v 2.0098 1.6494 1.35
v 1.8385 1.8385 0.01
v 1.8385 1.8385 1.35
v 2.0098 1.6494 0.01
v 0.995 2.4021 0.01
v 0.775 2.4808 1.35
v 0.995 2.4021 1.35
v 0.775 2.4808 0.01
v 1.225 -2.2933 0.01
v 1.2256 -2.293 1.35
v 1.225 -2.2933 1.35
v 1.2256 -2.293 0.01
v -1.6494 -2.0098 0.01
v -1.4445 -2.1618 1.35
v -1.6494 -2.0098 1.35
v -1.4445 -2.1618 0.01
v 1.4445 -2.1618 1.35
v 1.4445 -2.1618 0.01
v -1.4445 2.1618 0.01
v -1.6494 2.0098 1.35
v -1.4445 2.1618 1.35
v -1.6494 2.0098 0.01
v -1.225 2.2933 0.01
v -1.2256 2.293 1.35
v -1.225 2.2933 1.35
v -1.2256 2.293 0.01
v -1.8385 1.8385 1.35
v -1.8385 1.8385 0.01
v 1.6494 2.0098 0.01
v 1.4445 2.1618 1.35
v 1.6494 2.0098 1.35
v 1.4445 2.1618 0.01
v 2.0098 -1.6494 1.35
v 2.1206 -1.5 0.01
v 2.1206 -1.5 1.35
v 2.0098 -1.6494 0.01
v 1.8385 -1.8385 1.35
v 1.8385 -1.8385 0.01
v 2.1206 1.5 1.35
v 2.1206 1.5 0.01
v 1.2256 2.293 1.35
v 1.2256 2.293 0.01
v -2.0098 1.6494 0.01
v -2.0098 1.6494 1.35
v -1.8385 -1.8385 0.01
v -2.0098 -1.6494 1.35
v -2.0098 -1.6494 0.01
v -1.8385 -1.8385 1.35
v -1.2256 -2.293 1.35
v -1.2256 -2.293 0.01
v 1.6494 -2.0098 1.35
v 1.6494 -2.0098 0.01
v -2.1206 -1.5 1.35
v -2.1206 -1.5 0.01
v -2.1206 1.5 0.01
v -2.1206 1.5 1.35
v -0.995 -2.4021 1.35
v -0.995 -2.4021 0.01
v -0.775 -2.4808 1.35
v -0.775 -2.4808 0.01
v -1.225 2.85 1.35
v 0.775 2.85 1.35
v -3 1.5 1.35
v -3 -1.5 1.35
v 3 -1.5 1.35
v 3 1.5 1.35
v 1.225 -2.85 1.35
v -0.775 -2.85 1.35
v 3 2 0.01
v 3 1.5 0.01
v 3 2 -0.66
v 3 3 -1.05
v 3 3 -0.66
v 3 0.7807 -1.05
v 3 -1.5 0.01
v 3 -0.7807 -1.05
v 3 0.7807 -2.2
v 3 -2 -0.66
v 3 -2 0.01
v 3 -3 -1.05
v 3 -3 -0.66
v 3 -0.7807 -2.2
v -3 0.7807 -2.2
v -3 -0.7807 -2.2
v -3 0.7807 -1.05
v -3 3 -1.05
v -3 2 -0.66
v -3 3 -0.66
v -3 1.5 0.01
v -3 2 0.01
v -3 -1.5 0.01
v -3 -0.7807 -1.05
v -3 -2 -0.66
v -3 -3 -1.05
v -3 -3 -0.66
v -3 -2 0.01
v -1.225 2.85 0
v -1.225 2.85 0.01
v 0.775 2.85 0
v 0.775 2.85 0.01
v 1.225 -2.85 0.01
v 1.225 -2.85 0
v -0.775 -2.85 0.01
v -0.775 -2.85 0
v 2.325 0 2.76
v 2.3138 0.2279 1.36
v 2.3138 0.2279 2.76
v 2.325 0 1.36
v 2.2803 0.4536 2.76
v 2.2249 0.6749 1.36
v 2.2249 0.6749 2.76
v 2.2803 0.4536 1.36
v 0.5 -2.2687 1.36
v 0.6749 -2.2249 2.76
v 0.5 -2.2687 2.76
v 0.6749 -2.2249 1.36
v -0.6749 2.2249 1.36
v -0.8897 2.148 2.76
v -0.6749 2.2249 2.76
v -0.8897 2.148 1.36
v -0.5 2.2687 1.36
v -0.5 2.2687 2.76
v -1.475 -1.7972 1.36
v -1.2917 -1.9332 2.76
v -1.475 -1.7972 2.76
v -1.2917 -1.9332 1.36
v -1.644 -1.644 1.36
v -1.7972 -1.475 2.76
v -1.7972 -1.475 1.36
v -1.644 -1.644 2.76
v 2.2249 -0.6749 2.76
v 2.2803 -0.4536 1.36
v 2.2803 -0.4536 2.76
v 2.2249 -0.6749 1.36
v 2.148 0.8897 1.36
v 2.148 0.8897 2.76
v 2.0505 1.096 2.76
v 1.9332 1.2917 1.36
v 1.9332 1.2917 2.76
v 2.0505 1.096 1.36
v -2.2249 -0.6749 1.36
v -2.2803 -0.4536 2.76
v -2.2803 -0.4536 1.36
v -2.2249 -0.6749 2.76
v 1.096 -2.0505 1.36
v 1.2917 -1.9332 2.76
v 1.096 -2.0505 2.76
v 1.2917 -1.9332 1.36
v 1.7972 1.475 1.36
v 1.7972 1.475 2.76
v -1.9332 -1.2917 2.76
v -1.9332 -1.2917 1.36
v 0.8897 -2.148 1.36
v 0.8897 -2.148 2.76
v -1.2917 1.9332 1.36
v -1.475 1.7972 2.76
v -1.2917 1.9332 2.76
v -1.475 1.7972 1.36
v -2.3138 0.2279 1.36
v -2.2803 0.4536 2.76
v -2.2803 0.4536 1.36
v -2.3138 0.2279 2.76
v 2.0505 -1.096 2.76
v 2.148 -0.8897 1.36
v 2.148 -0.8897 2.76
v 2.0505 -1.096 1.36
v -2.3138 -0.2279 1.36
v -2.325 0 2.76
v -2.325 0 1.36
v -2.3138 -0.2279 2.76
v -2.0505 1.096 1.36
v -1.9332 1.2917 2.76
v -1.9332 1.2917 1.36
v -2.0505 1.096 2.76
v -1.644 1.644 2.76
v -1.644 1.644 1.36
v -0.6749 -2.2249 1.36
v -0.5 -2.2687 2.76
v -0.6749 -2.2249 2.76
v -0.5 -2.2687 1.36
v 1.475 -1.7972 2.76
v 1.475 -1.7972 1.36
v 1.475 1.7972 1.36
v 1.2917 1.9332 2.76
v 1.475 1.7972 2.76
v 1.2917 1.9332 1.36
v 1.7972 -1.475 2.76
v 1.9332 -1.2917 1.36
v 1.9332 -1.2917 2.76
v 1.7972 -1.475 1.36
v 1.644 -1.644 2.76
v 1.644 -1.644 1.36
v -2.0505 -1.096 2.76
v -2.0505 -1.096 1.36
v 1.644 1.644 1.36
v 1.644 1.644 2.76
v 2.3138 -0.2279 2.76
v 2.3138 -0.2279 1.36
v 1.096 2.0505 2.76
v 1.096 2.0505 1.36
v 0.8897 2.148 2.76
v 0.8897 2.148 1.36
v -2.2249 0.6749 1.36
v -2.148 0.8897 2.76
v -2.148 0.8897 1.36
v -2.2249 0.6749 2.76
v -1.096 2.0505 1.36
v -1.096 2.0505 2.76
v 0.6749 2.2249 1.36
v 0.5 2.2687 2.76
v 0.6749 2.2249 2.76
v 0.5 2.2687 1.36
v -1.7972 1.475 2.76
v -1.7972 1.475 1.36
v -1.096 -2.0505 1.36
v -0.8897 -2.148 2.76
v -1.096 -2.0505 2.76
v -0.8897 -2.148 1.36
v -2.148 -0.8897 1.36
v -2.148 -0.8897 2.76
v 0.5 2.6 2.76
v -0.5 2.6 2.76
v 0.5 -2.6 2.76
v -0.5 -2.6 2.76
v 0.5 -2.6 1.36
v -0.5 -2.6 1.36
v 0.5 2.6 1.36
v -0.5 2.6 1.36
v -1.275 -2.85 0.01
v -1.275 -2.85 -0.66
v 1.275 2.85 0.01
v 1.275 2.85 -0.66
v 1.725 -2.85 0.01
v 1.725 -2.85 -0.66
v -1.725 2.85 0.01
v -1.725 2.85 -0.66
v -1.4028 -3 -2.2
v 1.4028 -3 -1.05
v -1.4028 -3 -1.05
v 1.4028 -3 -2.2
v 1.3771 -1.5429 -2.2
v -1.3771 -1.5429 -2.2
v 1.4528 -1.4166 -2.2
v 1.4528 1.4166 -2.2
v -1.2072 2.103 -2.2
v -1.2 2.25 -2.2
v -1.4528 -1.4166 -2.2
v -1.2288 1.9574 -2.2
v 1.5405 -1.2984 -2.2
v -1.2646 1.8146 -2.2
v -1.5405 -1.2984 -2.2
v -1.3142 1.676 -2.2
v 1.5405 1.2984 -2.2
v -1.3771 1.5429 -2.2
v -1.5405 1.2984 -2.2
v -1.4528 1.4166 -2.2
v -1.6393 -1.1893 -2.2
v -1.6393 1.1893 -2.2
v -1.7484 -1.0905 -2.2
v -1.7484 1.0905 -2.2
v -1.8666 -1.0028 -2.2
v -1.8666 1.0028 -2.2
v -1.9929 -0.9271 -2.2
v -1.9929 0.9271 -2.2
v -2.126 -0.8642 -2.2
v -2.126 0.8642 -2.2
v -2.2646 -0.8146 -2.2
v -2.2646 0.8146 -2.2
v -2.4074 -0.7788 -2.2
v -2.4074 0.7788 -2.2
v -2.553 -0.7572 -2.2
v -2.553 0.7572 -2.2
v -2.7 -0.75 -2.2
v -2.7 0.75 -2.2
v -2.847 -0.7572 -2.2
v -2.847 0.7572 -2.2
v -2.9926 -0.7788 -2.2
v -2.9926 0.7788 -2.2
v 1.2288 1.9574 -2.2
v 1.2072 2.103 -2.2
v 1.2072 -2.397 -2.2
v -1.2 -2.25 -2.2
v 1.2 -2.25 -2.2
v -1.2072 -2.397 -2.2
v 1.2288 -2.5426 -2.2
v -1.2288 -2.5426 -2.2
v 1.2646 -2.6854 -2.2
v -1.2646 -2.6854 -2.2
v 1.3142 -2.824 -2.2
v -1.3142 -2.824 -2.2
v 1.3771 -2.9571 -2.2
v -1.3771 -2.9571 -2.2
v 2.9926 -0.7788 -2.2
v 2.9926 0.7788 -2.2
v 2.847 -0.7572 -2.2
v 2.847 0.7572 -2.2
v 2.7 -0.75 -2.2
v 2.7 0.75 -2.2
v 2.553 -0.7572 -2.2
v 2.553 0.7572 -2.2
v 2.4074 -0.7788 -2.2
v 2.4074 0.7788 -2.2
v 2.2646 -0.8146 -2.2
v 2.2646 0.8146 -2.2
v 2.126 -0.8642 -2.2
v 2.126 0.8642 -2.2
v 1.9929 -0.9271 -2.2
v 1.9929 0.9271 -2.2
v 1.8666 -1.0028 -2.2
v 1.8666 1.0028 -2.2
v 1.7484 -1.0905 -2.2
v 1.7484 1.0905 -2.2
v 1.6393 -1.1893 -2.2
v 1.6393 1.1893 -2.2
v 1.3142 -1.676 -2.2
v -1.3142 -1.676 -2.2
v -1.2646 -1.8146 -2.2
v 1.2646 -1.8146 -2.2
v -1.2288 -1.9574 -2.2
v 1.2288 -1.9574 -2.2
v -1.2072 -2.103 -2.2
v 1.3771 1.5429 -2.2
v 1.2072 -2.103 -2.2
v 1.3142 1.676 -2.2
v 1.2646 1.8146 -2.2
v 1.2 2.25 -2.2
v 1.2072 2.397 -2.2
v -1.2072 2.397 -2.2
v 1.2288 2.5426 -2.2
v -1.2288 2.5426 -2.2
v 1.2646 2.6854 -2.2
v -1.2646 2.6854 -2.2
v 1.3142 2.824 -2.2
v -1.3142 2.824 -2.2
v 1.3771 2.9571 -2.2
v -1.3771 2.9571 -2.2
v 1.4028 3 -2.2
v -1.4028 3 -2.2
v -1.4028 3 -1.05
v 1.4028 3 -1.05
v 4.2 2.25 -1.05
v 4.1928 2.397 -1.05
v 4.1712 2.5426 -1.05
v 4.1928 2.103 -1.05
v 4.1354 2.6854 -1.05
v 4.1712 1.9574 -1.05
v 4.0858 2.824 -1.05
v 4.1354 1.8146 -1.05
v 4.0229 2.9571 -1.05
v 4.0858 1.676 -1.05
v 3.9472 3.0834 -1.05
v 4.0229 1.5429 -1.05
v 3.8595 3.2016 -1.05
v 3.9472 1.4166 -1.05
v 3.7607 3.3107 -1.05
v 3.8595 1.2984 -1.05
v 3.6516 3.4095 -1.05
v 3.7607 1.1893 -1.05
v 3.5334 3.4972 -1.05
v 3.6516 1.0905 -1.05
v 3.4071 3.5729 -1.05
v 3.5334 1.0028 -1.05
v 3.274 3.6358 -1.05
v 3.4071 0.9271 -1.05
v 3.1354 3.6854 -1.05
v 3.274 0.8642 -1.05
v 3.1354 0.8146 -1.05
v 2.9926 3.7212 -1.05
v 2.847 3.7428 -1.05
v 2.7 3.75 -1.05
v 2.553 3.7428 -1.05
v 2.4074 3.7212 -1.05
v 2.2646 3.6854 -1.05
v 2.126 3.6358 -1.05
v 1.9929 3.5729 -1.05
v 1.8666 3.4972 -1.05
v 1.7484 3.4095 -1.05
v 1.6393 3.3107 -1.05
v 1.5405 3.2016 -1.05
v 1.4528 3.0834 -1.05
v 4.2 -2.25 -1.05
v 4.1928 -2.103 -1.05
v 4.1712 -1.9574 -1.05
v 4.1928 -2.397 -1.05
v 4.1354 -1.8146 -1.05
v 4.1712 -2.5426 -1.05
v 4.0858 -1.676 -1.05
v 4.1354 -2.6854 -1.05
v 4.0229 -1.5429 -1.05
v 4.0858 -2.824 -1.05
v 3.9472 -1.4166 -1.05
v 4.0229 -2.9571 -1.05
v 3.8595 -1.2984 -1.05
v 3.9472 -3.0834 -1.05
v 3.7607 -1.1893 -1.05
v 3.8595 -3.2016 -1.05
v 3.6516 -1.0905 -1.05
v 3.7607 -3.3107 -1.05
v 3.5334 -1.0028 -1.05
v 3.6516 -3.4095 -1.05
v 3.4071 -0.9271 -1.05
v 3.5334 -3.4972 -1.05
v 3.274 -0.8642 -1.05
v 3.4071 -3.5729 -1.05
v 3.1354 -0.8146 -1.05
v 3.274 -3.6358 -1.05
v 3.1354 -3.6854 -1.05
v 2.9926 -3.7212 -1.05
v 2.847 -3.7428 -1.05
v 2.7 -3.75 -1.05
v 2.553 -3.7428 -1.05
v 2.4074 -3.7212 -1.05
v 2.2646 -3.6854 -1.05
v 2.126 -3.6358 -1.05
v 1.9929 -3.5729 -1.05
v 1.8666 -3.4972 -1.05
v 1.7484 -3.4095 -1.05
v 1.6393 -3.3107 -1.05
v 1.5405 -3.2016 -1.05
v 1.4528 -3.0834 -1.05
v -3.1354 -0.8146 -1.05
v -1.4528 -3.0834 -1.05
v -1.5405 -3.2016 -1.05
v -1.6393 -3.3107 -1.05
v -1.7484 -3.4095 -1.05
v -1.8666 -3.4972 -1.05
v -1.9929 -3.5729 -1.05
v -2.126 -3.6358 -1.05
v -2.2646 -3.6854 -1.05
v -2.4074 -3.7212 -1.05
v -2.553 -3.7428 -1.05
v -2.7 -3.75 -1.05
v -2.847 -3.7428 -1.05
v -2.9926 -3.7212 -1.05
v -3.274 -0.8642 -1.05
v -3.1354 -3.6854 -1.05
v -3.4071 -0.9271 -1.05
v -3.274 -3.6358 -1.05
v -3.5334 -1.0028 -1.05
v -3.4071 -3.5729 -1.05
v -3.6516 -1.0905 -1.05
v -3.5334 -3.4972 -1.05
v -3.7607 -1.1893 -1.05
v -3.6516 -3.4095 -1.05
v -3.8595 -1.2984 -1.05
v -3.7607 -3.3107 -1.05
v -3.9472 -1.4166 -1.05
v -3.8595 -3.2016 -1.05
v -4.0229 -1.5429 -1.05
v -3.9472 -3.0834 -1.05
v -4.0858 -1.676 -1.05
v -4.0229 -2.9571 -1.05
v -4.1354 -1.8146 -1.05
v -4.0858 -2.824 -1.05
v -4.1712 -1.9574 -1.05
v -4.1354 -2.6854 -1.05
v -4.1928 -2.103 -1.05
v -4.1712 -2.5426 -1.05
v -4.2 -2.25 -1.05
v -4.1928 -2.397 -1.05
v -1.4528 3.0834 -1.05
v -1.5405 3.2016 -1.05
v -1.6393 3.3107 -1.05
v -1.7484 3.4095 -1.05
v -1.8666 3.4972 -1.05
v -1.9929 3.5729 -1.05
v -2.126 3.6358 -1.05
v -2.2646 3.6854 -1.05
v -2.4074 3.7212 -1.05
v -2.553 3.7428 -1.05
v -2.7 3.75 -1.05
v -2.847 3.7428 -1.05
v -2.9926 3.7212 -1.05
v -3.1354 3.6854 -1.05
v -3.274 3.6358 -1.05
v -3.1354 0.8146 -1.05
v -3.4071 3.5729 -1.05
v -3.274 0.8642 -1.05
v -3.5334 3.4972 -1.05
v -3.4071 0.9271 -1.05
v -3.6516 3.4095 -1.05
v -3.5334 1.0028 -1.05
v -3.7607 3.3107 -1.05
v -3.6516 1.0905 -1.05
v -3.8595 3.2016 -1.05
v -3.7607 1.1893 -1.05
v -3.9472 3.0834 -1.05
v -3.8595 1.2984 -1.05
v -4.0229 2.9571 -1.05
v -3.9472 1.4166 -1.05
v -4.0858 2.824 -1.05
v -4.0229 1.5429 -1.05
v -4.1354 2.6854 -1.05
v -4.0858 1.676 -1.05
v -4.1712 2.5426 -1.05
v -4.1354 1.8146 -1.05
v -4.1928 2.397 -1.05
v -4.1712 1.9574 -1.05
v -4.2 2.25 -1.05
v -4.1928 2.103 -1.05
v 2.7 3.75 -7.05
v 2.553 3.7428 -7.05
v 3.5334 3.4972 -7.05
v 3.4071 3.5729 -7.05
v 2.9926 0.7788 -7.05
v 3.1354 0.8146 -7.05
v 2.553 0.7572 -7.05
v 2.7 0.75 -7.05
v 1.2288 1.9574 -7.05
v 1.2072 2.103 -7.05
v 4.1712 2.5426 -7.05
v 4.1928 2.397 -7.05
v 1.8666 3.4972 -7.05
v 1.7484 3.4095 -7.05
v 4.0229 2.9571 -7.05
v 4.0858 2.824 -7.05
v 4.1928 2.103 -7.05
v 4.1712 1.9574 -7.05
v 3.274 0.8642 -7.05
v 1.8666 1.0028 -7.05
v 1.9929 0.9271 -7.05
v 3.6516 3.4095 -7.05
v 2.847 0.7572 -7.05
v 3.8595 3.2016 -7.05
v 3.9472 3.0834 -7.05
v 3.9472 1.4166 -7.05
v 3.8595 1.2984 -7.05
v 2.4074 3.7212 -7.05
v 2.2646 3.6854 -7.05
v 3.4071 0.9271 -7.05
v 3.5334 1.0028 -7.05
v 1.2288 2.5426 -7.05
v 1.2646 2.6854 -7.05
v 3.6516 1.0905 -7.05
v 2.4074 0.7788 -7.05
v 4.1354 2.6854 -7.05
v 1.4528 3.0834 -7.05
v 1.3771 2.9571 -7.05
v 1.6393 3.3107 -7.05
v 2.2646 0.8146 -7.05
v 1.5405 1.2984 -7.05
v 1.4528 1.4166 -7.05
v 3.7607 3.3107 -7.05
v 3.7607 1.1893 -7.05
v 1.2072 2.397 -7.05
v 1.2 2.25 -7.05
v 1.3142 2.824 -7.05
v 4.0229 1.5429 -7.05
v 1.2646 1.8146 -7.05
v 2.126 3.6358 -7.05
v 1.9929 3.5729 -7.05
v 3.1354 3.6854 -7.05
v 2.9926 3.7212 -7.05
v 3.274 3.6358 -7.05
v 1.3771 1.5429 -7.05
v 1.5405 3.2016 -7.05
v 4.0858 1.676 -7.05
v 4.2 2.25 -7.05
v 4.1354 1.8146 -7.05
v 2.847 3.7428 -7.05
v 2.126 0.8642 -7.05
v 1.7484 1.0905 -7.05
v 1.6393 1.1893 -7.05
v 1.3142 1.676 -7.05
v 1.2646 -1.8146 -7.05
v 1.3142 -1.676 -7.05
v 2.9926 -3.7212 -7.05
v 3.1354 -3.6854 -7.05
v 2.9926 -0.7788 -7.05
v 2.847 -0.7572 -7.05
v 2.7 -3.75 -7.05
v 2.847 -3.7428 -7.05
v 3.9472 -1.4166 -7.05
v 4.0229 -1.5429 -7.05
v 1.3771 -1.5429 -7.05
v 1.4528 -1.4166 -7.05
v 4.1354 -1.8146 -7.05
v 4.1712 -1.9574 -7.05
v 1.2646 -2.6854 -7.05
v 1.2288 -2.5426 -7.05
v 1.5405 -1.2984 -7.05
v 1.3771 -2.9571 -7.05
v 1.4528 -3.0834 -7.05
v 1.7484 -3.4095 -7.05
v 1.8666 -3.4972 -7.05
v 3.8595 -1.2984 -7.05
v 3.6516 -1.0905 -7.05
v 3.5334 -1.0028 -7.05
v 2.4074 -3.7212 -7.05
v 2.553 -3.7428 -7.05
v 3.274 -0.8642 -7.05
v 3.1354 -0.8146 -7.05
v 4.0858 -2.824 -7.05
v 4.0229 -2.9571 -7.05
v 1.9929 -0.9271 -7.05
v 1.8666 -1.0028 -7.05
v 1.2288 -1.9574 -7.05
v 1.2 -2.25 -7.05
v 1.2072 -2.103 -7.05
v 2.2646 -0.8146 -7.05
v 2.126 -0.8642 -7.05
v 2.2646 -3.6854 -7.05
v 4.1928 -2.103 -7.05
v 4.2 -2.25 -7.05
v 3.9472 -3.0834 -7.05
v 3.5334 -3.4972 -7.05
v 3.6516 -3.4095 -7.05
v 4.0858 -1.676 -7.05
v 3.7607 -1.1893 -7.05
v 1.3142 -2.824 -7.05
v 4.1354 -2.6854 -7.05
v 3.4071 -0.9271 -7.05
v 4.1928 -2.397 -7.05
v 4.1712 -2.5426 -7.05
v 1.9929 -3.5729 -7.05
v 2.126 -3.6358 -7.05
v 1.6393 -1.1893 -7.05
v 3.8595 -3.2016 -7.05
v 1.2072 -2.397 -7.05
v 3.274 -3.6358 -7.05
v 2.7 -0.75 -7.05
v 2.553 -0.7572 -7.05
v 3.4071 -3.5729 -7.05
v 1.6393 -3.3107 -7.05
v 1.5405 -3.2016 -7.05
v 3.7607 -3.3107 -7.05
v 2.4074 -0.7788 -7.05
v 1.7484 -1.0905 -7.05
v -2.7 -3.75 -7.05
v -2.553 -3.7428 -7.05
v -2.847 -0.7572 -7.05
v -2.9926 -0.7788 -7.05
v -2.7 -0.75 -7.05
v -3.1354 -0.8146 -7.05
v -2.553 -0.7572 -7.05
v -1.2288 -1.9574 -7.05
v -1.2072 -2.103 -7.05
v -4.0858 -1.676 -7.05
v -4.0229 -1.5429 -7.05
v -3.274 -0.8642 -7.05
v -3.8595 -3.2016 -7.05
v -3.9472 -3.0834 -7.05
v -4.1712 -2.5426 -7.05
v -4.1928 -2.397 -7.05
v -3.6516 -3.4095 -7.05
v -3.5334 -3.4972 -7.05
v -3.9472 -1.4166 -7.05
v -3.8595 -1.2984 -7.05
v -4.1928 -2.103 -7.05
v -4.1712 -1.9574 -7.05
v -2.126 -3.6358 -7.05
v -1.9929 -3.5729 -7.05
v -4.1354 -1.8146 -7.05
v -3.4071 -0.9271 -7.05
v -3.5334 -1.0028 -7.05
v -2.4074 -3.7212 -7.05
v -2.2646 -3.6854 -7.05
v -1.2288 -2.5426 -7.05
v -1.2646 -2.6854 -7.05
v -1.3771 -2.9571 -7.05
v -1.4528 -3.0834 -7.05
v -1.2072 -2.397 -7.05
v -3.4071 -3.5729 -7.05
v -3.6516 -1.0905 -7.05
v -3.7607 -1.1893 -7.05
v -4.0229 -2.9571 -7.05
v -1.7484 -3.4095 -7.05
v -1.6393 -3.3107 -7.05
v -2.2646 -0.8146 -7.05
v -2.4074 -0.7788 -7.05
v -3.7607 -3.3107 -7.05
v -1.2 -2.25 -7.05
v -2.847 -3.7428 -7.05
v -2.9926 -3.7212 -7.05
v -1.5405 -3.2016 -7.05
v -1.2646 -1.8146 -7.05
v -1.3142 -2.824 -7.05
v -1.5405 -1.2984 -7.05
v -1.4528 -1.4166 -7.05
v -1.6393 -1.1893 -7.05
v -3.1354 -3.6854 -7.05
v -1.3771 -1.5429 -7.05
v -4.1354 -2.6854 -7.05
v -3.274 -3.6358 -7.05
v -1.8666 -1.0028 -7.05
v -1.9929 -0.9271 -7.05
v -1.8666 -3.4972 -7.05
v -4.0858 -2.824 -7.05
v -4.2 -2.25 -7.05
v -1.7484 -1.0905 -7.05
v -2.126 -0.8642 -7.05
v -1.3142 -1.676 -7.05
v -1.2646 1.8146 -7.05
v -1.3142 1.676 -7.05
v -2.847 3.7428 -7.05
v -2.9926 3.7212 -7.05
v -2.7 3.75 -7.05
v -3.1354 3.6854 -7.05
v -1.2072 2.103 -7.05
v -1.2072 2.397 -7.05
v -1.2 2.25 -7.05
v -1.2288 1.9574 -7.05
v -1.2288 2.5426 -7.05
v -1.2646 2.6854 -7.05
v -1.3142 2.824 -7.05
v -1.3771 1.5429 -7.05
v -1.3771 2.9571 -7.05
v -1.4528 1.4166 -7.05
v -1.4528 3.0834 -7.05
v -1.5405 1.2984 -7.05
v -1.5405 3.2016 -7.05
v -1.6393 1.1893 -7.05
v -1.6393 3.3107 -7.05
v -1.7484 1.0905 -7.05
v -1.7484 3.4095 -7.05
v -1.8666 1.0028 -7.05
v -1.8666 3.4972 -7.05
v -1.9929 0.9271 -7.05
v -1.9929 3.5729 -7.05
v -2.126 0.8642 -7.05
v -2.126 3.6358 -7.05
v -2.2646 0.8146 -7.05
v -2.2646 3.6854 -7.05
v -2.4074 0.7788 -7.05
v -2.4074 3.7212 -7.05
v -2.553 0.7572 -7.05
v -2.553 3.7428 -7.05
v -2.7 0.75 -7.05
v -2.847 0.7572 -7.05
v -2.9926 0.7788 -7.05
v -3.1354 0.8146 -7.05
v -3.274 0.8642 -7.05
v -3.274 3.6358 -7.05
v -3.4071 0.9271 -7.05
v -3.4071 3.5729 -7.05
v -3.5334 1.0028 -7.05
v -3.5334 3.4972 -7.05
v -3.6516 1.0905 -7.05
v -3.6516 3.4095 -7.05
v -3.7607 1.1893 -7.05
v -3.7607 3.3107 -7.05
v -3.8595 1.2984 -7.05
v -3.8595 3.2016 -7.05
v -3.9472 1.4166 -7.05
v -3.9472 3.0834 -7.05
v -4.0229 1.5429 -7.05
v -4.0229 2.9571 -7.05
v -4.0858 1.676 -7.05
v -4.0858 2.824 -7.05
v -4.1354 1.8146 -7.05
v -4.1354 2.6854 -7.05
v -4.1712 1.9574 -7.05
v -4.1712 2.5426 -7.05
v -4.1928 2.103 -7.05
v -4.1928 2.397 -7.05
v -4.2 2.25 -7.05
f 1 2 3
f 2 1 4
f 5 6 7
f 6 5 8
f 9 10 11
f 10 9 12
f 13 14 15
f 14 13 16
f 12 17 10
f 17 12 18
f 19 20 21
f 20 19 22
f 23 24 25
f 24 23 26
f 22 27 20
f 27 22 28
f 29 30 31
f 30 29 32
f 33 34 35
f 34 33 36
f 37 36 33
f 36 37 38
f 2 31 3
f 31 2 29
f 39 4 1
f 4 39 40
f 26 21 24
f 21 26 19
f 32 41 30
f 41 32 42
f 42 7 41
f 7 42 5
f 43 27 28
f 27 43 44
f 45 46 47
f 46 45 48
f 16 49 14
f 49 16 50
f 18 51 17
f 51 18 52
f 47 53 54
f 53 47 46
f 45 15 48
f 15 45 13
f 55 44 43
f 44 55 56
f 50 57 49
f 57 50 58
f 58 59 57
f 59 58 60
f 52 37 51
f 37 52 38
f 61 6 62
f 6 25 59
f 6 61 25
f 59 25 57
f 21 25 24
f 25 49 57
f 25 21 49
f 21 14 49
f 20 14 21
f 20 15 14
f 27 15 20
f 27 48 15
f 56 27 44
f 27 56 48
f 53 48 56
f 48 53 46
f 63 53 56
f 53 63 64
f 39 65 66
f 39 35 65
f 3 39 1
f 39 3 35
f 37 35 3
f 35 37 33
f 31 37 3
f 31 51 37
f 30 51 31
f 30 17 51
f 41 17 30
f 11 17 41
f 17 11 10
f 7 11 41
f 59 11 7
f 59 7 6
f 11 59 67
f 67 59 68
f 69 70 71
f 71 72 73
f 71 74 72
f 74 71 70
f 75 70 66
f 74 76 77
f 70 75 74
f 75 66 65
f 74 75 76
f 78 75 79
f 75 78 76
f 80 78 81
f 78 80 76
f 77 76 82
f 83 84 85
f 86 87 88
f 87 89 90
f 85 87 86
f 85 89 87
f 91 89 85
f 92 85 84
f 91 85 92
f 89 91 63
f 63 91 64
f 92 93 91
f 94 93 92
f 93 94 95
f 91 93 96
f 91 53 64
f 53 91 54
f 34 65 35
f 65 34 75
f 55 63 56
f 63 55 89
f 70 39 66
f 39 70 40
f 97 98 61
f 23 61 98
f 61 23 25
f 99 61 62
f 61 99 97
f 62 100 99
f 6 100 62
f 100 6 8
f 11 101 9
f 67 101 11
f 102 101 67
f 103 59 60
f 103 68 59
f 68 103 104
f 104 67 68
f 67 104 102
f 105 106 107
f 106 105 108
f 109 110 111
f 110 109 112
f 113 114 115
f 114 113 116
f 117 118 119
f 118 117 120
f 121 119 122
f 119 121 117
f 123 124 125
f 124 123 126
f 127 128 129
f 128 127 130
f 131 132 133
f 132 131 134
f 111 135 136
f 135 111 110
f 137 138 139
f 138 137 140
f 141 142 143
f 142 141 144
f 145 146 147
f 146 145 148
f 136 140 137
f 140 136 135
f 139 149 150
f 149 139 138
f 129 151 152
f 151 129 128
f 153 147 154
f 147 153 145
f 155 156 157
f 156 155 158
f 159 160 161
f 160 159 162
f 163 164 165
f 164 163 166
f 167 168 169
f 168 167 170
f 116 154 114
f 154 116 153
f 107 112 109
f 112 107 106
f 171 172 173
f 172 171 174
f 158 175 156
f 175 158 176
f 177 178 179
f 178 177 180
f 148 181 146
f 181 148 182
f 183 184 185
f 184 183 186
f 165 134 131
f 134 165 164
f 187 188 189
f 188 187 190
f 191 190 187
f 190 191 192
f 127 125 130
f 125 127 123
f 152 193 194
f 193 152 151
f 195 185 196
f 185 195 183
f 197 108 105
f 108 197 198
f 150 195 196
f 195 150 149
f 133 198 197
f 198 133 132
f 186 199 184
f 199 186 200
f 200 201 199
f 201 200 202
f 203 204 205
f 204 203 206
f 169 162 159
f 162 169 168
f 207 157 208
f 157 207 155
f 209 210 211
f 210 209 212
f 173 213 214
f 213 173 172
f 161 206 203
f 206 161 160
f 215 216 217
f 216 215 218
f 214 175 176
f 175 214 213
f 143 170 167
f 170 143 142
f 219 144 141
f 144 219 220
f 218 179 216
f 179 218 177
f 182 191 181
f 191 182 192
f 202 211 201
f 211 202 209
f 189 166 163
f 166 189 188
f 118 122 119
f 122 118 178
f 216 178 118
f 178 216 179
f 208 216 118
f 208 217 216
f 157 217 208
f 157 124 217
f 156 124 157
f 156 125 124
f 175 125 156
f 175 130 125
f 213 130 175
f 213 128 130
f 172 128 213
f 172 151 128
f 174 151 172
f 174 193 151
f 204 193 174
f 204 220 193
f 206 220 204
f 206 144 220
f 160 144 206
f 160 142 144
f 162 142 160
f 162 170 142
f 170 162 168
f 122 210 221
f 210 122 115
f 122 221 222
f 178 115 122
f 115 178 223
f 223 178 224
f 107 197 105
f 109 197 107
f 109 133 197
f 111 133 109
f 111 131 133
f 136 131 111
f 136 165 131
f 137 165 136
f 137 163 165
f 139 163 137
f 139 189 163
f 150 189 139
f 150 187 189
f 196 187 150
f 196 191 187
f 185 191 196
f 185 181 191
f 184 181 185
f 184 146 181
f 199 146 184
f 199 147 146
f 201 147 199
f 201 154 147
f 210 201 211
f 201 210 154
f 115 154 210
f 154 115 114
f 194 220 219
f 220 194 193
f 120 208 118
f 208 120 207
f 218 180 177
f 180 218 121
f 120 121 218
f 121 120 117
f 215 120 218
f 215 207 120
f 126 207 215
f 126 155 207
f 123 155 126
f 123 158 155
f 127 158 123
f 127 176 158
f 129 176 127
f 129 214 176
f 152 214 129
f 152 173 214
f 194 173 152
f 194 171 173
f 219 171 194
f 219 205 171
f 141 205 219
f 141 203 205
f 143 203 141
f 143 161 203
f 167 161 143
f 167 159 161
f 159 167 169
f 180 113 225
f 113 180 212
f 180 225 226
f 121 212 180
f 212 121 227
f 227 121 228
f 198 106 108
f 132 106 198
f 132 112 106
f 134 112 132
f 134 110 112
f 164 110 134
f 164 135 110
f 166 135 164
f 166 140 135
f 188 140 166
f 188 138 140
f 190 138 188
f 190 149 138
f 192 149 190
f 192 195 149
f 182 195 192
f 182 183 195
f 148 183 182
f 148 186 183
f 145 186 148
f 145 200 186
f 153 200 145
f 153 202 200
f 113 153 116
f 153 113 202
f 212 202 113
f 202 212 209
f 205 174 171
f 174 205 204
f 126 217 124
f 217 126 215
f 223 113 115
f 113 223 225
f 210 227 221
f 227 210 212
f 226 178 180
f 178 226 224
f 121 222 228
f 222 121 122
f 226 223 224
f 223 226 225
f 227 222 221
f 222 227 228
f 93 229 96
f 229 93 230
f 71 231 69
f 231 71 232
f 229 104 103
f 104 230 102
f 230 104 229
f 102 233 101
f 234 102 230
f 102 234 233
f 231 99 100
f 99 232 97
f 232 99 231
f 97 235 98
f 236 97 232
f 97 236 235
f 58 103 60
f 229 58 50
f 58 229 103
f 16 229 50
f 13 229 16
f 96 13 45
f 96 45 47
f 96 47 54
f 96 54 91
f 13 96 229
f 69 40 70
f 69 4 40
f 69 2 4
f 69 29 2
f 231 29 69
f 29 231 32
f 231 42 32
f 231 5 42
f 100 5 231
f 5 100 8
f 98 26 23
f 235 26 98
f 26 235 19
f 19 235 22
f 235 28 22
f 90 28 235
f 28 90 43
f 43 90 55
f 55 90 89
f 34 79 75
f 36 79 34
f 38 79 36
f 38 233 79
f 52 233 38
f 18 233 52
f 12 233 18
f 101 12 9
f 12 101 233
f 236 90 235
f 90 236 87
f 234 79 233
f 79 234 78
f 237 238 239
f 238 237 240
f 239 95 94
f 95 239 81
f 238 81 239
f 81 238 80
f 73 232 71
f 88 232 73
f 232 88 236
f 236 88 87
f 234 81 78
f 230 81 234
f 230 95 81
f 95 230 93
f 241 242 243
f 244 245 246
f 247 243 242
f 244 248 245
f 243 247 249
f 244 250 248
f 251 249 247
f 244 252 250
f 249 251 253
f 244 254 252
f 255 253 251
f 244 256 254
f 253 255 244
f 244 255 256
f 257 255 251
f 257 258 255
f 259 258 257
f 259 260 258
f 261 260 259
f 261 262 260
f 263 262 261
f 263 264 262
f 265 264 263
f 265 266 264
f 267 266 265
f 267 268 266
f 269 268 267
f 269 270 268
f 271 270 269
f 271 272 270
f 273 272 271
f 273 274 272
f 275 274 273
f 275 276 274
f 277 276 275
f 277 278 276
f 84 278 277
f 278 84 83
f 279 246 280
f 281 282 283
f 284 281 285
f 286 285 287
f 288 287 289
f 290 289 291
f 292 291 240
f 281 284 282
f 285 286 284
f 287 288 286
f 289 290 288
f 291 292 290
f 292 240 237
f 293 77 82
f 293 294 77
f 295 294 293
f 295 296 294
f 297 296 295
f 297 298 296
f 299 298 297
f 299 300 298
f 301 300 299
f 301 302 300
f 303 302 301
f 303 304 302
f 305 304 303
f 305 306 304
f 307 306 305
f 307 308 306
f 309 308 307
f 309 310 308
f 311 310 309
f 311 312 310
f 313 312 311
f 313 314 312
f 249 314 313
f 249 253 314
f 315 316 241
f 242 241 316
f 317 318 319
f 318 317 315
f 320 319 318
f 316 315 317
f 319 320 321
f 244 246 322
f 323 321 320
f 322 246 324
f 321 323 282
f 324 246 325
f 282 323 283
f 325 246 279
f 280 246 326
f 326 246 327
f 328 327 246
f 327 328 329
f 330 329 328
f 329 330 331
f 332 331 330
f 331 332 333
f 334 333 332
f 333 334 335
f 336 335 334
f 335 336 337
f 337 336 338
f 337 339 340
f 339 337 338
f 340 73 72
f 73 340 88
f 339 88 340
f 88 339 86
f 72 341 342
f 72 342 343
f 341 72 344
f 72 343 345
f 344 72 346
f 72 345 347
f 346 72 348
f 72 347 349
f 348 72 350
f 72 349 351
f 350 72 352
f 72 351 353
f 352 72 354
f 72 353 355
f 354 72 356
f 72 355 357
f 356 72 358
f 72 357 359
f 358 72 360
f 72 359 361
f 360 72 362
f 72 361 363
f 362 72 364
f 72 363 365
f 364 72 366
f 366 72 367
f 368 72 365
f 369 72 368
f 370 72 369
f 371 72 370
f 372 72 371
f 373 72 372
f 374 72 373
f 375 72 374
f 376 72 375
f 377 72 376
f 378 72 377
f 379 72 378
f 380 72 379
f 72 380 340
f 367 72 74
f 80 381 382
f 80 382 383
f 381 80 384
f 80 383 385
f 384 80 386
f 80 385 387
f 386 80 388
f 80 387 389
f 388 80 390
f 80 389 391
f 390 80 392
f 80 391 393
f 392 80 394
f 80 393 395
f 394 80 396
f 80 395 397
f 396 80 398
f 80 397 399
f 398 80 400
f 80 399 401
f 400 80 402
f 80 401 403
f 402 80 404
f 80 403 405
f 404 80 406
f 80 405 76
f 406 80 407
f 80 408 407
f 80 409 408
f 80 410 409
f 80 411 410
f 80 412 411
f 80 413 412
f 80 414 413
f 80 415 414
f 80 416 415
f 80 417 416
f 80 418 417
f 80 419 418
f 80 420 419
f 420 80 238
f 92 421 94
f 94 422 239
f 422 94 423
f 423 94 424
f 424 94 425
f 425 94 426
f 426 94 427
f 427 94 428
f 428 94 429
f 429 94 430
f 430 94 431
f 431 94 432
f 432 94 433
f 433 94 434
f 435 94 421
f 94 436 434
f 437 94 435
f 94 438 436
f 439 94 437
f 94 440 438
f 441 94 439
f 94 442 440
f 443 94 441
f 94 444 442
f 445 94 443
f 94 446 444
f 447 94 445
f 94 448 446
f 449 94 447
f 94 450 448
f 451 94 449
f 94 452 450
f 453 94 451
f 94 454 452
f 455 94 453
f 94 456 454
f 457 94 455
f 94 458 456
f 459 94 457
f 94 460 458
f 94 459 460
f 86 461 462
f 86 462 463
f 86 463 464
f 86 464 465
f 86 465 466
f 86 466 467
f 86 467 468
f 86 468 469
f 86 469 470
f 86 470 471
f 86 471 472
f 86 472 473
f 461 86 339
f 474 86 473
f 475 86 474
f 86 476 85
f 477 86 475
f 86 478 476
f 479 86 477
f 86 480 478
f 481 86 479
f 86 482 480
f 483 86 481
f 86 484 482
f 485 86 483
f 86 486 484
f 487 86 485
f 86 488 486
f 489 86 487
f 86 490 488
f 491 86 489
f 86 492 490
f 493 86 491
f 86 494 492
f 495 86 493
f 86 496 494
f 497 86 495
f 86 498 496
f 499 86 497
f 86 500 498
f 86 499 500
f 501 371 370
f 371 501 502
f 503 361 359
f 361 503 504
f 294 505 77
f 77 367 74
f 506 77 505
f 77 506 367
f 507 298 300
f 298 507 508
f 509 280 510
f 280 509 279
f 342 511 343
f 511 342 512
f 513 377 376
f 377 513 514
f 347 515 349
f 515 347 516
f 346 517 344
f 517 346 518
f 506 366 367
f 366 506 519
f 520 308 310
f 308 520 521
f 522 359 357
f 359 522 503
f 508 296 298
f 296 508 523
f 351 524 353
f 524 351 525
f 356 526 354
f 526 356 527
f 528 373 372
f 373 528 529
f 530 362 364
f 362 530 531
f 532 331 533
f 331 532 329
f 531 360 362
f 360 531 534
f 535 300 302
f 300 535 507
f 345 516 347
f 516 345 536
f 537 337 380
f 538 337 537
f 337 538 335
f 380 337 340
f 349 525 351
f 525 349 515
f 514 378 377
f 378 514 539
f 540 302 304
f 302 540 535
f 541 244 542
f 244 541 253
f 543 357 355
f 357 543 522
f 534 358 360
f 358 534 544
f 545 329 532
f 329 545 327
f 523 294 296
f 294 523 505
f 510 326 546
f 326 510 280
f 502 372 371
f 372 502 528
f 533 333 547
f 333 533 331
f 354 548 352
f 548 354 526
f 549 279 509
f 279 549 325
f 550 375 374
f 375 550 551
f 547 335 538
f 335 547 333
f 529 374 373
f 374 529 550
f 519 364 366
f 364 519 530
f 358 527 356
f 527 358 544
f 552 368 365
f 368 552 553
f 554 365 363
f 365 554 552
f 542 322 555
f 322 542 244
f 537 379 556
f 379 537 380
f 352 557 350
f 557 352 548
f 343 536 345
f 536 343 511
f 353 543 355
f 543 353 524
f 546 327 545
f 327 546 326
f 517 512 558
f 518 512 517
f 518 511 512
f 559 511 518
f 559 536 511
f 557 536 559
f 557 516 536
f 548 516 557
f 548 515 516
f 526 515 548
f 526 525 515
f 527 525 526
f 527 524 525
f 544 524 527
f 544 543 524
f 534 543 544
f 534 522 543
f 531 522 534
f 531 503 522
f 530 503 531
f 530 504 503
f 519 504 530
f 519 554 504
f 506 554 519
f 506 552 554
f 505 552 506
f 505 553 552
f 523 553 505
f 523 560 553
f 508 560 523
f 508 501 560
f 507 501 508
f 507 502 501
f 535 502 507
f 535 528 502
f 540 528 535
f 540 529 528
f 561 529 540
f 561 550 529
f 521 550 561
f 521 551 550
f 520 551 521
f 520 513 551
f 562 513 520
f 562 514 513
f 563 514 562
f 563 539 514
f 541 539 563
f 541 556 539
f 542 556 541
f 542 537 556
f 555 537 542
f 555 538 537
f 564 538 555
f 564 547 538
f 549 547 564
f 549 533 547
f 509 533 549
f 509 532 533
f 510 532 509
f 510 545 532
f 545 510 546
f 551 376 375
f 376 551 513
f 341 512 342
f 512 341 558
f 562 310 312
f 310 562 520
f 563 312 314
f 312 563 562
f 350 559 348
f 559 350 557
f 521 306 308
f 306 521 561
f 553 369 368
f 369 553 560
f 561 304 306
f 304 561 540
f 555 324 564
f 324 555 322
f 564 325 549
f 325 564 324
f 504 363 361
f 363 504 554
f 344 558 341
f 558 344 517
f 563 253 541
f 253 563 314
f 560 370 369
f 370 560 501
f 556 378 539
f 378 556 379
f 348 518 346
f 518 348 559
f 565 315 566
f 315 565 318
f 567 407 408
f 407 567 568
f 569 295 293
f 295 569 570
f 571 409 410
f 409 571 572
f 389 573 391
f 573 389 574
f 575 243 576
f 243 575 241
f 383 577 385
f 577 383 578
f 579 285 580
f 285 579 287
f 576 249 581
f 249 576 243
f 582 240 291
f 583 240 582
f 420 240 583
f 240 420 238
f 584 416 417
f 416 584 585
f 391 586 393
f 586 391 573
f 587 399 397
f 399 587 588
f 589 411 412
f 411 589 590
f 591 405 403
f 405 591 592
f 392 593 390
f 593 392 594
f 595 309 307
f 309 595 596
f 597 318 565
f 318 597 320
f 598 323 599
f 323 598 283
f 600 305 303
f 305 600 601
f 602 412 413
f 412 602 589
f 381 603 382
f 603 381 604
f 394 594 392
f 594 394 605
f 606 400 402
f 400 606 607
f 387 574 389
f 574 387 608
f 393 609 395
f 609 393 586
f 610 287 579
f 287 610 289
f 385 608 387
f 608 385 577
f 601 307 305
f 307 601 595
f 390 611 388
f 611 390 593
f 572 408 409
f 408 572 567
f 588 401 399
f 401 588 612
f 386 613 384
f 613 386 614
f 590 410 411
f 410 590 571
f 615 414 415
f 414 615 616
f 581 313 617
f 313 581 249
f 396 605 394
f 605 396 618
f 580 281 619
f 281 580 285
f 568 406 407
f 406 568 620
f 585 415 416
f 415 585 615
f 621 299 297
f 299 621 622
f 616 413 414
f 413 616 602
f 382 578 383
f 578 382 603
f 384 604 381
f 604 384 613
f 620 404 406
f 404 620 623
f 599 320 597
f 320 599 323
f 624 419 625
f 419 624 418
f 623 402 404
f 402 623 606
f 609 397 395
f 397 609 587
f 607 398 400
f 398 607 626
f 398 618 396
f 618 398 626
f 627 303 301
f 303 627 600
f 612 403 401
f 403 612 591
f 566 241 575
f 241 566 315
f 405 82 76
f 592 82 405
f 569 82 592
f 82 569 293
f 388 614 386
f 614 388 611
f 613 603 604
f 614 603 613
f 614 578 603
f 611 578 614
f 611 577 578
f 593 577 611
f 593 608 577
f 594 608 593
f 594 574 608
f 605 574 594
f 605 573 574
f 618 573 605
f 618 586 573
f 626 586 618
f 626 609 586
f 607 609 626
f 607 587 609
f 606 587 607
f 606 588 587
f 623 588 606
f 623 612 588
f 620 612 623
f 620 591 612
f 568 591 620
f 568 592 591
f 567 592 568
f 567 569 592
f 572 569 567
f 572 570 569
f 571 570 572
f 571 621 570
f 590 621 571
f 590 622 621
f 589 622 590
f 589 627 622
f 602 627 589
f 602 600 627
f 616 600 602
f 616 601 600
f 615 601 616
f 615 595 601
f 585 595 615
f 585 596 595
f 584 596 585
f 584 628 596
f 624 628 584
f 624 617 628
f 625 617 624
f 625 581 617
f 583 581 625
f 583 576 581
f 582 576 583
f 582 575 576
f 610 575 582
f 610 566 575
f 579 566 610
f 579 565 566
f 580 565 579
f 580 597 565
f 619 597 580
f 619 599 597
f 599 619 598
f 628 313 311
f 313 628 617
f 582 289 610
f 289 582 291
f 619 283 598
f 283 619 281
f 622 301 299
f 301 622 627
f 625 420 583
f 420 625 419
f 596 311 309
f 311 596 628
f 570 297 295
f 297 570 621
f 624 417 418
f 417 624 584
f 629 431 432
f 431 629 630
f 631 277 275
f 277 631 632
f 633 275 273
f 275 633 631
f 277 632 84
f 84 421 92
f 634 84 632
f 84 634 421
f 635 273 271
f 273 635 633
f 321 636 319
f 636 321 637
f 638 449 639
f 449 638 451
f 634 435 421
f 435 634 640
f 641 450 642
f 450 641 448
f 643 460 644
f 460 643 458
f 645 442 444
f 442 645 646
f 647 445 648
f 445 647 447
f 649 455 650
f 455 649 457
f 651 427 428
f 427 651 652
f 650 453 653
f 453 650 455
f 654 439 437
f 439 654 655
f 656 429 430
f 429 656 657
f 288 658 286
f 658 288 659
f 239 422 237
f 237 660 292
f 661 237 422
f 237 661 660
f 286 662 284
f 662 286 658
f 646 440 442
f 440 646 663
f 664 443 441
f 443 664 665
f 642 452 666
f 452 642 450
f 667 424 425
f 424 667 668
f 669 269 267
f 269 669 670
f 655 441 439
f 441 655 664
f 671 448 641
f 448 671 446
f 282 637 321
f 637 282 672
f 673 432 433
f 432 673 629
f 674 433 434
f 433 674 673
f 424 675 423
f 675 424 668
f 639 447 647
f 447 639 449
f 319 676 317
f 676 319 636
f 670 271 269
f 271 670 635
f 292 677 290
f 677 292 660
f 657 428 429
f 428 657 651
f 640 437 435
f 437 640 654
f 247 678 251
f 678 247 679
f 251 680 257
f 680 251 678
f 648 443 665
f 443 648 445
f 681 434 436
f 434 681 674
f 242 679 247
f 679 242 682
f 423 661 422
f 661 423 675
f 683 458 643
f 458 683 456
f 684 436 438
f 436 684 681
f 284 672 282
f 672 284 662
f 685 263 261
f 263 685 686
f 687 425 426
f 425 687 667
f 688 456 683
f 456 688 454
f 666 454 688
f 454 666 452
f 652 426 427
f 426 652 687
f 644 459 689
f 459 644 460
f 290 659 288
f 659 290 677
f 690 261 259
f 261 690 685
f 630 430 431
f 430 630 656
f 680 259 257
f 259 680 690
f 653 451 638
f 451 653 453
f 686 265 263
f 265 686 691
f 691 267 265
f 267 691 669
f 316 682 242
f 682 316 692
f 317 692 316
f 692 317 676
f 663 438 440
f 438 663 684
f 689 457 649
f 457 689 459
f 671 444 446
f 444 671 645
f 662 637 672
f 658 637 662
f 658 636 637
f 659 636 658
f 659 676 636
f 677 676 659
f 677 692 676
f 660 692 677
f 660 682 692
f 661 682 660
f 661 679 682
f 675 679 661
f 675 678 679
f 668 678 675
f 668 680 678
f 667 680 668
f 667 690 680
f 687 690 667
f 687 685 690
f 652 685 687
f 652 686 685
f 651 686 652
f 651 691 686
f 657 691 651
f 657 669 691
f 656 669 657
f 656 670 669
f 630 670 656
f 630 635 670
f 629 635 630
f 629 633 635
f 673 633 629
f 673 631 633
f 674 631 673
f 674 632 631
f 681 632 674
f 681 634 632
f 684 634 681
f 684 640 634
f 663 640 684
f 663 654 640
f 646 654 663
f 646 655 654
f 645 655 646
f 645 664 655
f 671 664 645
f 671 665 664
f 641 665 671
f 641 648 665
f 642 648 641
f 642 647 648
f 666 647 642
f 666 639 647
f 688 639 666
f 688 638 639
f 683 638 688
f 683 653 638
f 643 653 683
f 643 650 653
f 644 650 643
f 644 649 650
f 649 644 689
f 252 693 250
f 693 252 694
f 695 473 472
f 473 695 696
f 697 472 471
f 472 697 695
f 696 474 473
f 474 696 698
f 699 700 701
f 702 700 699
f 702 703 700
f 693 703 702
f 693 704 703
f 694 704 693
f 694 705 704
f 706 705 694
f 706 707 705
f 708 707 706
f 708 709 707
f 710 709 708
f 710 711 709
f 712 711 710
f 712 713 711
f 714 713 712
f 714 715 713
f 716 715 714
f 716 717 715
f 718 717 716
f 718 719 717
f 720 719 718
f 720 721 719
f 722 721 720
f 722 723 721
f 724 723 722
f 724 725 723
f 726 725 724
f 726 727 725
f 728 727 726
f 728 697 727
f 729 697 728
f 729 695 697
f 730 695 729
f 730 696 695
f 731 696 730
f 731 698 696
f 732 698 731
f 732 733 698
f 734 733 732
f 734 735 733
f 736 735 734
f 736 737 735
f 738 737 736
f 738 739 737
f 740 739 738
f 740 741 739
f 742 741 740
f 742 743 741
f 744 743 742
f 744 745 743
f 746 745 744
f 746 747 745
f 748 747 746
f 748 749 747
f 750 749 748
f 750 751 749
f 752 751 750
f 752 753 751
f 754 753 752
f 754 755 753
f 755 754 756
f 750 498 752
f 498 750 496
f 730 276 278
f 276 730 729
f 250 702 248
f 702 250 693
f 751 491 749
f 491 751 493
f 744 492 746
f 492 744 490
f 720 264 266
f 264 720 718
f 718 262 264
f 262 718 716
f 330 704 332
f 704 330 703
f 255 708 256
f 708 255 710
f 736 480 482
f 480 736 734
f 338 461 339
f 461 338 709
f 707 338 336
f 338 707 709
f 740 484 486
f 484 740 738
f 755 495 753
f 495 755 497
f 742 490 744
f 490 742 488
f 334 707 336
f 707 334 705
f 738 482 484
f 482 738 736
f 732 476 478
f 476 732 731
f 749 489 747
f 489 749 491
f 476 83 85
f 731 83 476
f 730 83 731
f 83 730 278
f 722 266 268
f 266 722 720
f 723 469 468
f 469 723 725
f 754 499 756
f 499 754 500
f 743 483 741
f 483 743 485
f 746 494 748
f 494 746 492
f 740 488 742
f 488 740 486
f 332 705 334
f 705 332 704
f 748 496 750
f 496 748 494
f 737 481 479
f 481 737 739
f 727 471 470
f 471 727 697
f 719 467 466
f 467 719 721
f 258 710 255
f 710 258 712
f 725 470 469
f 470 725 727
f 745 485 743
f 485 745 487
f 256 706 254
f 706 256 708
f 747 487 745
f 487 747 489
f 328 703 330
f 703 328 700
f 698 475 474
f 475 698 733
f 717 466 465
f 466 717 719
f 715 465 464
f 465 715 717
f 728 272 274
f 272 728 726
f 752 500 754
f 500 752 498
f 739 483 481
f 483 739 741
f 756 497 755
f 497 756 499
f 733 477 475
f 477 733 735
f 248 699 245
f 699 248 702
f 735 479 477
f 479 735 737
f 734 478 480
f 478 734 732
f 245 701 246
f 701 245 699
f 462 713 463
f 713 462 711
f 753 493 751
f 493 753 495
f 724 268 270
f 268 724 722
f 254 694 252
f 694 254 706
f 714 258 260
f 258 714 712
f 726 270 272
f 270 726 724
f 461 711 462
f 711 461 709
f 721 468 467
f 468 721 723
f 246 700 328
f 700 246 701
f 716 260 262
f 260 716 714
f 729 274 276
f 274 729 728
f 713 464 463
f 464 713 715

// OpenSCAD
// Start: lazy_union
default_5_default_5();
// End: lazy_union

// Modules.

// 'PartMaterial undef-default - default 5.0'
module default_5_default_5() {
  // 'None : _combine_solids_and_holes'
  union() {
    // 'default : _combine_solids_and_holes'
    union() {
      // 'evq : _combine_solids_and_holes'
      union() {
        // 'post'
        multmatrix(m=[[1.0, 0.0, 0.0, 0.0], [-0.0, -1.0, -0.0, -0.0], [-0.0, -0.0, -1.0, 0.6749999999999998], [0.0, 0.0, 0.0, 1.0]]) {
          // 'post : _combine_solids_and_holes'
          union() {
            // 'master'
            multmatrix(m=[[1.0, 0.0, 0.0, 0.0], [-0.0, -1.0, -0.0, -0.0], [-0.0, -0.0, -1.0, 0.6749999999999998], [0.0, 0.0, 0.0, 1.0]]) {
              // 'master : _combine_solids_and_holes'
              union() {
                // 'master'
                cylinder(h=1.3499999999999996, r1=2.6, r2=2.6, center=false, $fn=64);
              }
            }
            // 'block1'
            multmatrix(m=[[1.0, 0.0, 0.0, -3.0], [0.0, 1.0, 0.0, -1.5], [0.0, 0.0, 1.0, -0.6749999999999998], [0.0, 0.0, 0.0, 1.0]]) {
              // 'block1 : _combine_solids_and_holes'
              union() {
                // 'block1'
                cube(size=[6.0, 3.0, 1.3499999999999996]);
              }
            }
            // ('block2', 0)
            multmatrix(m=[[1.0, 0.0, 0.0, -1.225], [-0.0, -1.0, -0.0, -0.0], [-0.0, -0.0, -1.0, 0.6749999999999998], [0.0, 0.0, 0.0, 1.0]]) {
              // "('block2', 0) : _combine_solids_and_holes"
              union() {
                // ('block2', 0)
                cube(size=[2.0, 2.85, 1.3499999999999996]);
              }
            }
            // ('block2', 1)
            multmatrix(m=[[1.0, 0.0, 0.0, -0.7749999999999999], [0.0, 1.0, 0.0, 0.0], [0.0, 0.0, 1.0, -0.6749999999999998], [0.0, 0.0, 0.0, 1.0]]) {
              // "('block2', 1) : _combine_solids_and_holes"
              union() {
                // ('block2', 1)
                cube(size=[2.0, 2.85, 1.3499999999999996]);
              }
            }
          }
        }
        // 'plunger'
        multmatrix(m=[[1.0, 0.0, 0.0, 0.0], [0.0, -1.0, 0.0, 0.0], [0.0, 0.0, -1.0, 2.0599999999999996], [0.0, 0.0, 0.0, 1.0]]) {
          // 'plunger : _combine_solids_and_holes'
          union() {
            // 'plunger'
            multmatrix(m=[[1.0, 0.0, 0.0, 0.0], [-0.0, -1.0, -0.0, -0.0], [-0.0, -0.0, -1.0, 0.7], [0.0, 0.0, 0.0, 1.0]]) {
              // 'plunger : _combine_solids_and_holes'
              union() {
                // 'plunger'
                cylinder(h=1.4, r1=2.325, r2=2.325, center=false, $fn=64);
              }
            }
            // 'tab'
            multmatrix(m=[[1.0, 0.0, 0.0, -0.5], [0.0, 1.0, 0.0, -2.6], [0.0, 0.0, 1.0, -0.7], [0.0, 0.0, 0.0, 1.0]]) {
              // 'tab : _combine_solids_and_holes'
              union() {
                // 'tab'
                cube(size=[1.0, 5.2, 1.4]);
              }
            }
          }
        }
        // 'centre_plate'
        multmatrix(m=[[0.0, 0.0, 1.0, -3.0], [-1.0, 0.0, 0.0, 2.0], [0.0, -1.0, 0.0, 0.01], [0.0, 0.0, 0.0, 1.0]]) {
          // 'centre_plate : _combine_solids_and_holes'
          union() {
            // 'centre_plate'
            multmatrix(m=[[-0.0, -1.0, -0.0, 2.0], [0.0, 0.0, 1.0, 0.0], [-1.0, -0.0, -0.0, 3.0], [0.0, 0.0, 0.0, 1.0]]) {
              // 'centre_plate : _combine_solids_and_holes'
              union() {
                // 'centre_plate'
                linear_extrude(height=0.6800000000000002, twist=0.0, slices=4, scale=[1.0, 1.0], $fn=64) {
                  polygon(points=[[3.0, 2.0], [3.0, -2.0], [1.275, -2.85], [-1.725, -2.85], [-3.0, -2.0], [-3.0, 2.0], [-1.275, 2.85], [1.725, 2.85]]);
                }
              }
            }
          }
        }
        // 'base_plate'
        multmatrix(m=[[0.0, 1.0, 0.0, -3.0], [-1.0, 0.0, 0.0, 3.0], [0.0, 0.0, 1.0, -2.2], [0.0, 0.0, 0.0, 1.0]]) {
          // 'base_plate : _combine_solids_and_holes'
          union() {
            // 'base_plate'
            cube(size=[6.0, 6.0, 1.54]);
          }
        }
        // ('terminal', 0)
        multmatrix(m=[[0.0, 1.0, 0.0, 2.7], [-1.0, 0.0, 0.0, 2.25], [0.0, 0.0, 1.0, -1.6250000000000002], [0.0, 0.0, 0.0, 1.0]]) {
          // "('terminal', 0) : _combine_solids_and_holes"
          union() {
            // 'terminal'
            multmatrix(m=[[1.0, 0.0, 0.0, -0.375], [0.0, 1.0, 0.0, -0.8], [0.0, 0.0, 1.0, -0.575], [0.0, 0.0, 0.0, 1.0]]) {
              // 'terminal'
              color(c=[0.7529411764705882, 0.7529411764705882, 0.7529411764705882, 1.0]) {
                // 'terminal : _combine_solids_and_holes'
                union() {
                  // 'terminal'
                  cube(size=[0.75, 1.6, 1.15]);
                }
              }
            }
          }
        }
        // ('terminal', 1)
        multmatrix(m=[[0.0, 1.0, 0.0, 2.7], [-1.0, 0.0, 0.0, -2.25], [0.0, 0.0, 1.0, -1.6250000000000002], [0.0, 0.0, 0.0, 1.0]]) {
          // "('terminal', 1) : _combine_solids_and_holes"
          union() {
            // 'terminal'
            multmatrix(m=[[1.0, 0.0, 0.0, -0.375], [0.0, 1.0, 0.0, -0.8], [0.0, 0.0, 1.0, -0.575], [0.0, 0.0, 0.0, 1.0]]) {
              // 'terminal'
              color(c=[0.7529411764705882, 0.7529411764705882, 0.7529411764705882, 1.0]) {
                // 'terminal : _combine_solids_and_holes'
                union() {
                  // 'terminal'
                  cube(size=[0.75, 1.6, 1.15]);
                }
              }
            }
          }
        }
        // ('terminal', 2)
        multmatrix(m=[[0.0, -1.0, 0.0, -2.7], [1.0, 0.0, 0.0, -2.25], [0.0, 0.0, 1.0, -1.6250000000000002], [0.0, 0.0, 0.0, 1.0]]) {
          // "('terminal', 2) : _combine_solids_and_holes"
          union() {
            // 'terminal'
            multmatrix(m=[[1.0, 0.0, 0.0, -0.375], [0.0, 1.0, 0.0, -0.8], [0.0, 0.0, 1.0, -0.575], [0.0, 0.0, 0.0, 1.0]]) {
              // 'terminal'
              color(c=[0.7529411764705882, 0.7529411764705882, 0.7529411764705882, 1.0]) {
                // 'terminal : _combine_solids_and_holes'
                union() {
                  // 'terminal'
                  cube(size=[0.75, 1.6, 1.15]);
                }
              }
            }
          }
        }
        // ('terminal', 3)
        multmatrix(m=[[0.0, -1.0, 0.0, -2.7], [1.0, 0.0, 0.0, 2.25], [0.0, 0.0, 1.0, -1.6250000000000002], [0.0, 0.0, 0.0, 1.0]]) {
          // "('terminal', 3) : _combine_solids_and_holes"
          union() {
            // 'terminal'
            multmatrix(m=[[1.0, 0.0, 0.0, -0.375], [0.0, 1.0, 0.0, -0.8], [0.0, 0.0, 1.0, -0.575], [0.0, 0.0, 0.0, 1.0]]) {
              // 'terminal'
              color(c=[0.7529411764705882, 0.7529411764705882, 0.7529411764705882, 1.0]) {
                // 'terminal : _combine_solids_and_holes'
                union() {
                  // 'terminal'
                  cube(size=[0.75, 1.6, 1.15]);
                }
              }
            }
          }
        }
      }
      // ('terminal_hole', 0)
      multmatrix(m=[[0.0, 1.0, 0.0, 2.7], [-1.0, 0.0, 0.0, 2.25], [0.0, 0.0, 1.0, -7.050000000000001], [0.0, 0.0, 0.0, 1.0]]) {
        // "('terminal_hole', 0) : _combine_solids_and_holes"
        union() {
          // ('terminal_hole', 0)
          cylinder(h=6.0, r1=1.5, r2=1.5, center=false, $fn=64);
        }
      }
      // ('terminal_hole', 1)
      multmatrix(m=[[0.0, 1.0, 0.0, 2.7], [-1.0, 0.0, 0.0, -2.25], [0.0, 0.0, 1.0, -7.050000000000001], [0.0, 0.0, 0.0, 1.0]]) {
        // "('terminal_hole', 1) : _combine_solids_and_holes"
        union() {
          // ('terminal_hole', 1)
          cylinder(h=6.0, r1=1.5, r2=1.5, center=false, $fn=64);
        }
      }
      // ('terminal_hole', 2)
      multmatrix(m=[[0.0, -1.0, 0.0, -2.7], [1.0, 0.0, 0.0, -2.25], [0.0, 0.0, 1.0, -7.050000000000001], [0.0, 0.0, 0.0, 1.0]]) {
        // "('terminal_hole', 2) : _combine_solids_and_holes"
        union() {
          // ('terminal_hole', 2)
          cylinder(h=6.0, r1=1.5, r2=1.5, center=false, $fn=64);
        }
      }
      // ('terminal_hole', 3)
      multmatrix(m=[[0.0, -1.0, 0.0, -2.7], [1.0, 0.0, 0.0, 2.25], [0.0, 0.0, 1.0, -7.050000000000001], [0.0, 0.0, 0.0, 1.0]]) {
        // "('terminal_hole', 3) : _combine_solids_and_holes"
        union() {
          // ('terminal_hole', 3)
          cylinder(h=6.0, r1=1.5, r2=1.5, center=false, $fn=64);
        }
      }
    }
  }
} // end module default_5_default_5
